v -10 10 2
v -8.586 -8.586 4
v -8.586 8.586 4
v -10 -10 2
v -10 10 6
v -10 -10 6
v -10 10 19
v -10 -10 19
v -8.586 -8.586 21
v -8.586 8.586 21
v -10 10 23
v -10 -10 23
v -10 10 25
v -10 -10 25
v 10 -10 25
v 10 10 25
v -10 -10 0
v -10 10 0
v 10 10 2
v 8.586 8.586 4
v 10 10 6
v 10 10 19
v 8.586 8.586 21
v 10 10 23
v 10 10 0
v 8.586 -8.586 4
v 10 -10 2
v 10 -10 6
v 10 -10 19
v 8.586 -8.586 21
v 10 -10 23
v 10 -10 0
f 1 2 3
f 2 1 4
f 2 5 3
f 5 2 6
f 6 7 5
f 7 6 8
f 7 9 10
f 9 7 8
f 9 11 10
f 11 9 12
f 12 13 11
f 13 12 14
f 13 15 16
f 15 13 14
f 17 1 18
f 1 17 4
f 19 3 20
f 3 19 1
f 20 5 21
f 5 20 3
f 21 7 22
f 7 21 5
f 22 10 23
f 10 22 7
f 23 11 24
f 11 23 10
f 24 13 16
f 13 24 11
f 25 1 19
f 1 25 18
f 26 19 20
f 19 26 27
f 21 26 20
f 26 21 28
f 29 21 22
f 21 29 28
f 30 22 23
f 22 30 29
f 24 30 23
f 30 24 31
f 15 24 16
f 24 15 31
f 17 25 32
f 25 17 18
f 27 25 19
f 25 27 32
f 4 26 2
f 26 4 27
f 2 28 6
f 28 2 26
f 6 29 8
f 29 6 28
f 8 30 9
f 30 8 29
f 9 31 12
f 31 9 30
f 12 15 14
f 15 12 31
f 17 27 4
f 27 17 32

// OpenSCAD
H=25;
L=20*sqrt(2);
l=4/sqrt(2);

module bloco(){
	rotate(45)
	rotate_extrude($fn=4)
	difference(){
		square([L/2,H]);

		translate([L/2,l*sqrt(2)])
		rotate(45) square([l,l], center=true);
	
		translate([L/2,H-l*sqrt(2)])
		rotate(45) square([l,l], center=true);
	}
}

module camada(nome, e, p=1){
		for (i=[0:3]){
			rotate(i*90)
			translate([-7.5,10+e-p,5])
			rotate([90,0])
			linear_extrude(height=e)
			translate([-0.5,0])
			scale(2.65)
			translate([0,-14.4])
			import("macaco.dxf", layer=nome);
		}
}

union(){
	difference(){
		bloco();
		camada("cabeca", 1, p=1-0.1);
	}
}
